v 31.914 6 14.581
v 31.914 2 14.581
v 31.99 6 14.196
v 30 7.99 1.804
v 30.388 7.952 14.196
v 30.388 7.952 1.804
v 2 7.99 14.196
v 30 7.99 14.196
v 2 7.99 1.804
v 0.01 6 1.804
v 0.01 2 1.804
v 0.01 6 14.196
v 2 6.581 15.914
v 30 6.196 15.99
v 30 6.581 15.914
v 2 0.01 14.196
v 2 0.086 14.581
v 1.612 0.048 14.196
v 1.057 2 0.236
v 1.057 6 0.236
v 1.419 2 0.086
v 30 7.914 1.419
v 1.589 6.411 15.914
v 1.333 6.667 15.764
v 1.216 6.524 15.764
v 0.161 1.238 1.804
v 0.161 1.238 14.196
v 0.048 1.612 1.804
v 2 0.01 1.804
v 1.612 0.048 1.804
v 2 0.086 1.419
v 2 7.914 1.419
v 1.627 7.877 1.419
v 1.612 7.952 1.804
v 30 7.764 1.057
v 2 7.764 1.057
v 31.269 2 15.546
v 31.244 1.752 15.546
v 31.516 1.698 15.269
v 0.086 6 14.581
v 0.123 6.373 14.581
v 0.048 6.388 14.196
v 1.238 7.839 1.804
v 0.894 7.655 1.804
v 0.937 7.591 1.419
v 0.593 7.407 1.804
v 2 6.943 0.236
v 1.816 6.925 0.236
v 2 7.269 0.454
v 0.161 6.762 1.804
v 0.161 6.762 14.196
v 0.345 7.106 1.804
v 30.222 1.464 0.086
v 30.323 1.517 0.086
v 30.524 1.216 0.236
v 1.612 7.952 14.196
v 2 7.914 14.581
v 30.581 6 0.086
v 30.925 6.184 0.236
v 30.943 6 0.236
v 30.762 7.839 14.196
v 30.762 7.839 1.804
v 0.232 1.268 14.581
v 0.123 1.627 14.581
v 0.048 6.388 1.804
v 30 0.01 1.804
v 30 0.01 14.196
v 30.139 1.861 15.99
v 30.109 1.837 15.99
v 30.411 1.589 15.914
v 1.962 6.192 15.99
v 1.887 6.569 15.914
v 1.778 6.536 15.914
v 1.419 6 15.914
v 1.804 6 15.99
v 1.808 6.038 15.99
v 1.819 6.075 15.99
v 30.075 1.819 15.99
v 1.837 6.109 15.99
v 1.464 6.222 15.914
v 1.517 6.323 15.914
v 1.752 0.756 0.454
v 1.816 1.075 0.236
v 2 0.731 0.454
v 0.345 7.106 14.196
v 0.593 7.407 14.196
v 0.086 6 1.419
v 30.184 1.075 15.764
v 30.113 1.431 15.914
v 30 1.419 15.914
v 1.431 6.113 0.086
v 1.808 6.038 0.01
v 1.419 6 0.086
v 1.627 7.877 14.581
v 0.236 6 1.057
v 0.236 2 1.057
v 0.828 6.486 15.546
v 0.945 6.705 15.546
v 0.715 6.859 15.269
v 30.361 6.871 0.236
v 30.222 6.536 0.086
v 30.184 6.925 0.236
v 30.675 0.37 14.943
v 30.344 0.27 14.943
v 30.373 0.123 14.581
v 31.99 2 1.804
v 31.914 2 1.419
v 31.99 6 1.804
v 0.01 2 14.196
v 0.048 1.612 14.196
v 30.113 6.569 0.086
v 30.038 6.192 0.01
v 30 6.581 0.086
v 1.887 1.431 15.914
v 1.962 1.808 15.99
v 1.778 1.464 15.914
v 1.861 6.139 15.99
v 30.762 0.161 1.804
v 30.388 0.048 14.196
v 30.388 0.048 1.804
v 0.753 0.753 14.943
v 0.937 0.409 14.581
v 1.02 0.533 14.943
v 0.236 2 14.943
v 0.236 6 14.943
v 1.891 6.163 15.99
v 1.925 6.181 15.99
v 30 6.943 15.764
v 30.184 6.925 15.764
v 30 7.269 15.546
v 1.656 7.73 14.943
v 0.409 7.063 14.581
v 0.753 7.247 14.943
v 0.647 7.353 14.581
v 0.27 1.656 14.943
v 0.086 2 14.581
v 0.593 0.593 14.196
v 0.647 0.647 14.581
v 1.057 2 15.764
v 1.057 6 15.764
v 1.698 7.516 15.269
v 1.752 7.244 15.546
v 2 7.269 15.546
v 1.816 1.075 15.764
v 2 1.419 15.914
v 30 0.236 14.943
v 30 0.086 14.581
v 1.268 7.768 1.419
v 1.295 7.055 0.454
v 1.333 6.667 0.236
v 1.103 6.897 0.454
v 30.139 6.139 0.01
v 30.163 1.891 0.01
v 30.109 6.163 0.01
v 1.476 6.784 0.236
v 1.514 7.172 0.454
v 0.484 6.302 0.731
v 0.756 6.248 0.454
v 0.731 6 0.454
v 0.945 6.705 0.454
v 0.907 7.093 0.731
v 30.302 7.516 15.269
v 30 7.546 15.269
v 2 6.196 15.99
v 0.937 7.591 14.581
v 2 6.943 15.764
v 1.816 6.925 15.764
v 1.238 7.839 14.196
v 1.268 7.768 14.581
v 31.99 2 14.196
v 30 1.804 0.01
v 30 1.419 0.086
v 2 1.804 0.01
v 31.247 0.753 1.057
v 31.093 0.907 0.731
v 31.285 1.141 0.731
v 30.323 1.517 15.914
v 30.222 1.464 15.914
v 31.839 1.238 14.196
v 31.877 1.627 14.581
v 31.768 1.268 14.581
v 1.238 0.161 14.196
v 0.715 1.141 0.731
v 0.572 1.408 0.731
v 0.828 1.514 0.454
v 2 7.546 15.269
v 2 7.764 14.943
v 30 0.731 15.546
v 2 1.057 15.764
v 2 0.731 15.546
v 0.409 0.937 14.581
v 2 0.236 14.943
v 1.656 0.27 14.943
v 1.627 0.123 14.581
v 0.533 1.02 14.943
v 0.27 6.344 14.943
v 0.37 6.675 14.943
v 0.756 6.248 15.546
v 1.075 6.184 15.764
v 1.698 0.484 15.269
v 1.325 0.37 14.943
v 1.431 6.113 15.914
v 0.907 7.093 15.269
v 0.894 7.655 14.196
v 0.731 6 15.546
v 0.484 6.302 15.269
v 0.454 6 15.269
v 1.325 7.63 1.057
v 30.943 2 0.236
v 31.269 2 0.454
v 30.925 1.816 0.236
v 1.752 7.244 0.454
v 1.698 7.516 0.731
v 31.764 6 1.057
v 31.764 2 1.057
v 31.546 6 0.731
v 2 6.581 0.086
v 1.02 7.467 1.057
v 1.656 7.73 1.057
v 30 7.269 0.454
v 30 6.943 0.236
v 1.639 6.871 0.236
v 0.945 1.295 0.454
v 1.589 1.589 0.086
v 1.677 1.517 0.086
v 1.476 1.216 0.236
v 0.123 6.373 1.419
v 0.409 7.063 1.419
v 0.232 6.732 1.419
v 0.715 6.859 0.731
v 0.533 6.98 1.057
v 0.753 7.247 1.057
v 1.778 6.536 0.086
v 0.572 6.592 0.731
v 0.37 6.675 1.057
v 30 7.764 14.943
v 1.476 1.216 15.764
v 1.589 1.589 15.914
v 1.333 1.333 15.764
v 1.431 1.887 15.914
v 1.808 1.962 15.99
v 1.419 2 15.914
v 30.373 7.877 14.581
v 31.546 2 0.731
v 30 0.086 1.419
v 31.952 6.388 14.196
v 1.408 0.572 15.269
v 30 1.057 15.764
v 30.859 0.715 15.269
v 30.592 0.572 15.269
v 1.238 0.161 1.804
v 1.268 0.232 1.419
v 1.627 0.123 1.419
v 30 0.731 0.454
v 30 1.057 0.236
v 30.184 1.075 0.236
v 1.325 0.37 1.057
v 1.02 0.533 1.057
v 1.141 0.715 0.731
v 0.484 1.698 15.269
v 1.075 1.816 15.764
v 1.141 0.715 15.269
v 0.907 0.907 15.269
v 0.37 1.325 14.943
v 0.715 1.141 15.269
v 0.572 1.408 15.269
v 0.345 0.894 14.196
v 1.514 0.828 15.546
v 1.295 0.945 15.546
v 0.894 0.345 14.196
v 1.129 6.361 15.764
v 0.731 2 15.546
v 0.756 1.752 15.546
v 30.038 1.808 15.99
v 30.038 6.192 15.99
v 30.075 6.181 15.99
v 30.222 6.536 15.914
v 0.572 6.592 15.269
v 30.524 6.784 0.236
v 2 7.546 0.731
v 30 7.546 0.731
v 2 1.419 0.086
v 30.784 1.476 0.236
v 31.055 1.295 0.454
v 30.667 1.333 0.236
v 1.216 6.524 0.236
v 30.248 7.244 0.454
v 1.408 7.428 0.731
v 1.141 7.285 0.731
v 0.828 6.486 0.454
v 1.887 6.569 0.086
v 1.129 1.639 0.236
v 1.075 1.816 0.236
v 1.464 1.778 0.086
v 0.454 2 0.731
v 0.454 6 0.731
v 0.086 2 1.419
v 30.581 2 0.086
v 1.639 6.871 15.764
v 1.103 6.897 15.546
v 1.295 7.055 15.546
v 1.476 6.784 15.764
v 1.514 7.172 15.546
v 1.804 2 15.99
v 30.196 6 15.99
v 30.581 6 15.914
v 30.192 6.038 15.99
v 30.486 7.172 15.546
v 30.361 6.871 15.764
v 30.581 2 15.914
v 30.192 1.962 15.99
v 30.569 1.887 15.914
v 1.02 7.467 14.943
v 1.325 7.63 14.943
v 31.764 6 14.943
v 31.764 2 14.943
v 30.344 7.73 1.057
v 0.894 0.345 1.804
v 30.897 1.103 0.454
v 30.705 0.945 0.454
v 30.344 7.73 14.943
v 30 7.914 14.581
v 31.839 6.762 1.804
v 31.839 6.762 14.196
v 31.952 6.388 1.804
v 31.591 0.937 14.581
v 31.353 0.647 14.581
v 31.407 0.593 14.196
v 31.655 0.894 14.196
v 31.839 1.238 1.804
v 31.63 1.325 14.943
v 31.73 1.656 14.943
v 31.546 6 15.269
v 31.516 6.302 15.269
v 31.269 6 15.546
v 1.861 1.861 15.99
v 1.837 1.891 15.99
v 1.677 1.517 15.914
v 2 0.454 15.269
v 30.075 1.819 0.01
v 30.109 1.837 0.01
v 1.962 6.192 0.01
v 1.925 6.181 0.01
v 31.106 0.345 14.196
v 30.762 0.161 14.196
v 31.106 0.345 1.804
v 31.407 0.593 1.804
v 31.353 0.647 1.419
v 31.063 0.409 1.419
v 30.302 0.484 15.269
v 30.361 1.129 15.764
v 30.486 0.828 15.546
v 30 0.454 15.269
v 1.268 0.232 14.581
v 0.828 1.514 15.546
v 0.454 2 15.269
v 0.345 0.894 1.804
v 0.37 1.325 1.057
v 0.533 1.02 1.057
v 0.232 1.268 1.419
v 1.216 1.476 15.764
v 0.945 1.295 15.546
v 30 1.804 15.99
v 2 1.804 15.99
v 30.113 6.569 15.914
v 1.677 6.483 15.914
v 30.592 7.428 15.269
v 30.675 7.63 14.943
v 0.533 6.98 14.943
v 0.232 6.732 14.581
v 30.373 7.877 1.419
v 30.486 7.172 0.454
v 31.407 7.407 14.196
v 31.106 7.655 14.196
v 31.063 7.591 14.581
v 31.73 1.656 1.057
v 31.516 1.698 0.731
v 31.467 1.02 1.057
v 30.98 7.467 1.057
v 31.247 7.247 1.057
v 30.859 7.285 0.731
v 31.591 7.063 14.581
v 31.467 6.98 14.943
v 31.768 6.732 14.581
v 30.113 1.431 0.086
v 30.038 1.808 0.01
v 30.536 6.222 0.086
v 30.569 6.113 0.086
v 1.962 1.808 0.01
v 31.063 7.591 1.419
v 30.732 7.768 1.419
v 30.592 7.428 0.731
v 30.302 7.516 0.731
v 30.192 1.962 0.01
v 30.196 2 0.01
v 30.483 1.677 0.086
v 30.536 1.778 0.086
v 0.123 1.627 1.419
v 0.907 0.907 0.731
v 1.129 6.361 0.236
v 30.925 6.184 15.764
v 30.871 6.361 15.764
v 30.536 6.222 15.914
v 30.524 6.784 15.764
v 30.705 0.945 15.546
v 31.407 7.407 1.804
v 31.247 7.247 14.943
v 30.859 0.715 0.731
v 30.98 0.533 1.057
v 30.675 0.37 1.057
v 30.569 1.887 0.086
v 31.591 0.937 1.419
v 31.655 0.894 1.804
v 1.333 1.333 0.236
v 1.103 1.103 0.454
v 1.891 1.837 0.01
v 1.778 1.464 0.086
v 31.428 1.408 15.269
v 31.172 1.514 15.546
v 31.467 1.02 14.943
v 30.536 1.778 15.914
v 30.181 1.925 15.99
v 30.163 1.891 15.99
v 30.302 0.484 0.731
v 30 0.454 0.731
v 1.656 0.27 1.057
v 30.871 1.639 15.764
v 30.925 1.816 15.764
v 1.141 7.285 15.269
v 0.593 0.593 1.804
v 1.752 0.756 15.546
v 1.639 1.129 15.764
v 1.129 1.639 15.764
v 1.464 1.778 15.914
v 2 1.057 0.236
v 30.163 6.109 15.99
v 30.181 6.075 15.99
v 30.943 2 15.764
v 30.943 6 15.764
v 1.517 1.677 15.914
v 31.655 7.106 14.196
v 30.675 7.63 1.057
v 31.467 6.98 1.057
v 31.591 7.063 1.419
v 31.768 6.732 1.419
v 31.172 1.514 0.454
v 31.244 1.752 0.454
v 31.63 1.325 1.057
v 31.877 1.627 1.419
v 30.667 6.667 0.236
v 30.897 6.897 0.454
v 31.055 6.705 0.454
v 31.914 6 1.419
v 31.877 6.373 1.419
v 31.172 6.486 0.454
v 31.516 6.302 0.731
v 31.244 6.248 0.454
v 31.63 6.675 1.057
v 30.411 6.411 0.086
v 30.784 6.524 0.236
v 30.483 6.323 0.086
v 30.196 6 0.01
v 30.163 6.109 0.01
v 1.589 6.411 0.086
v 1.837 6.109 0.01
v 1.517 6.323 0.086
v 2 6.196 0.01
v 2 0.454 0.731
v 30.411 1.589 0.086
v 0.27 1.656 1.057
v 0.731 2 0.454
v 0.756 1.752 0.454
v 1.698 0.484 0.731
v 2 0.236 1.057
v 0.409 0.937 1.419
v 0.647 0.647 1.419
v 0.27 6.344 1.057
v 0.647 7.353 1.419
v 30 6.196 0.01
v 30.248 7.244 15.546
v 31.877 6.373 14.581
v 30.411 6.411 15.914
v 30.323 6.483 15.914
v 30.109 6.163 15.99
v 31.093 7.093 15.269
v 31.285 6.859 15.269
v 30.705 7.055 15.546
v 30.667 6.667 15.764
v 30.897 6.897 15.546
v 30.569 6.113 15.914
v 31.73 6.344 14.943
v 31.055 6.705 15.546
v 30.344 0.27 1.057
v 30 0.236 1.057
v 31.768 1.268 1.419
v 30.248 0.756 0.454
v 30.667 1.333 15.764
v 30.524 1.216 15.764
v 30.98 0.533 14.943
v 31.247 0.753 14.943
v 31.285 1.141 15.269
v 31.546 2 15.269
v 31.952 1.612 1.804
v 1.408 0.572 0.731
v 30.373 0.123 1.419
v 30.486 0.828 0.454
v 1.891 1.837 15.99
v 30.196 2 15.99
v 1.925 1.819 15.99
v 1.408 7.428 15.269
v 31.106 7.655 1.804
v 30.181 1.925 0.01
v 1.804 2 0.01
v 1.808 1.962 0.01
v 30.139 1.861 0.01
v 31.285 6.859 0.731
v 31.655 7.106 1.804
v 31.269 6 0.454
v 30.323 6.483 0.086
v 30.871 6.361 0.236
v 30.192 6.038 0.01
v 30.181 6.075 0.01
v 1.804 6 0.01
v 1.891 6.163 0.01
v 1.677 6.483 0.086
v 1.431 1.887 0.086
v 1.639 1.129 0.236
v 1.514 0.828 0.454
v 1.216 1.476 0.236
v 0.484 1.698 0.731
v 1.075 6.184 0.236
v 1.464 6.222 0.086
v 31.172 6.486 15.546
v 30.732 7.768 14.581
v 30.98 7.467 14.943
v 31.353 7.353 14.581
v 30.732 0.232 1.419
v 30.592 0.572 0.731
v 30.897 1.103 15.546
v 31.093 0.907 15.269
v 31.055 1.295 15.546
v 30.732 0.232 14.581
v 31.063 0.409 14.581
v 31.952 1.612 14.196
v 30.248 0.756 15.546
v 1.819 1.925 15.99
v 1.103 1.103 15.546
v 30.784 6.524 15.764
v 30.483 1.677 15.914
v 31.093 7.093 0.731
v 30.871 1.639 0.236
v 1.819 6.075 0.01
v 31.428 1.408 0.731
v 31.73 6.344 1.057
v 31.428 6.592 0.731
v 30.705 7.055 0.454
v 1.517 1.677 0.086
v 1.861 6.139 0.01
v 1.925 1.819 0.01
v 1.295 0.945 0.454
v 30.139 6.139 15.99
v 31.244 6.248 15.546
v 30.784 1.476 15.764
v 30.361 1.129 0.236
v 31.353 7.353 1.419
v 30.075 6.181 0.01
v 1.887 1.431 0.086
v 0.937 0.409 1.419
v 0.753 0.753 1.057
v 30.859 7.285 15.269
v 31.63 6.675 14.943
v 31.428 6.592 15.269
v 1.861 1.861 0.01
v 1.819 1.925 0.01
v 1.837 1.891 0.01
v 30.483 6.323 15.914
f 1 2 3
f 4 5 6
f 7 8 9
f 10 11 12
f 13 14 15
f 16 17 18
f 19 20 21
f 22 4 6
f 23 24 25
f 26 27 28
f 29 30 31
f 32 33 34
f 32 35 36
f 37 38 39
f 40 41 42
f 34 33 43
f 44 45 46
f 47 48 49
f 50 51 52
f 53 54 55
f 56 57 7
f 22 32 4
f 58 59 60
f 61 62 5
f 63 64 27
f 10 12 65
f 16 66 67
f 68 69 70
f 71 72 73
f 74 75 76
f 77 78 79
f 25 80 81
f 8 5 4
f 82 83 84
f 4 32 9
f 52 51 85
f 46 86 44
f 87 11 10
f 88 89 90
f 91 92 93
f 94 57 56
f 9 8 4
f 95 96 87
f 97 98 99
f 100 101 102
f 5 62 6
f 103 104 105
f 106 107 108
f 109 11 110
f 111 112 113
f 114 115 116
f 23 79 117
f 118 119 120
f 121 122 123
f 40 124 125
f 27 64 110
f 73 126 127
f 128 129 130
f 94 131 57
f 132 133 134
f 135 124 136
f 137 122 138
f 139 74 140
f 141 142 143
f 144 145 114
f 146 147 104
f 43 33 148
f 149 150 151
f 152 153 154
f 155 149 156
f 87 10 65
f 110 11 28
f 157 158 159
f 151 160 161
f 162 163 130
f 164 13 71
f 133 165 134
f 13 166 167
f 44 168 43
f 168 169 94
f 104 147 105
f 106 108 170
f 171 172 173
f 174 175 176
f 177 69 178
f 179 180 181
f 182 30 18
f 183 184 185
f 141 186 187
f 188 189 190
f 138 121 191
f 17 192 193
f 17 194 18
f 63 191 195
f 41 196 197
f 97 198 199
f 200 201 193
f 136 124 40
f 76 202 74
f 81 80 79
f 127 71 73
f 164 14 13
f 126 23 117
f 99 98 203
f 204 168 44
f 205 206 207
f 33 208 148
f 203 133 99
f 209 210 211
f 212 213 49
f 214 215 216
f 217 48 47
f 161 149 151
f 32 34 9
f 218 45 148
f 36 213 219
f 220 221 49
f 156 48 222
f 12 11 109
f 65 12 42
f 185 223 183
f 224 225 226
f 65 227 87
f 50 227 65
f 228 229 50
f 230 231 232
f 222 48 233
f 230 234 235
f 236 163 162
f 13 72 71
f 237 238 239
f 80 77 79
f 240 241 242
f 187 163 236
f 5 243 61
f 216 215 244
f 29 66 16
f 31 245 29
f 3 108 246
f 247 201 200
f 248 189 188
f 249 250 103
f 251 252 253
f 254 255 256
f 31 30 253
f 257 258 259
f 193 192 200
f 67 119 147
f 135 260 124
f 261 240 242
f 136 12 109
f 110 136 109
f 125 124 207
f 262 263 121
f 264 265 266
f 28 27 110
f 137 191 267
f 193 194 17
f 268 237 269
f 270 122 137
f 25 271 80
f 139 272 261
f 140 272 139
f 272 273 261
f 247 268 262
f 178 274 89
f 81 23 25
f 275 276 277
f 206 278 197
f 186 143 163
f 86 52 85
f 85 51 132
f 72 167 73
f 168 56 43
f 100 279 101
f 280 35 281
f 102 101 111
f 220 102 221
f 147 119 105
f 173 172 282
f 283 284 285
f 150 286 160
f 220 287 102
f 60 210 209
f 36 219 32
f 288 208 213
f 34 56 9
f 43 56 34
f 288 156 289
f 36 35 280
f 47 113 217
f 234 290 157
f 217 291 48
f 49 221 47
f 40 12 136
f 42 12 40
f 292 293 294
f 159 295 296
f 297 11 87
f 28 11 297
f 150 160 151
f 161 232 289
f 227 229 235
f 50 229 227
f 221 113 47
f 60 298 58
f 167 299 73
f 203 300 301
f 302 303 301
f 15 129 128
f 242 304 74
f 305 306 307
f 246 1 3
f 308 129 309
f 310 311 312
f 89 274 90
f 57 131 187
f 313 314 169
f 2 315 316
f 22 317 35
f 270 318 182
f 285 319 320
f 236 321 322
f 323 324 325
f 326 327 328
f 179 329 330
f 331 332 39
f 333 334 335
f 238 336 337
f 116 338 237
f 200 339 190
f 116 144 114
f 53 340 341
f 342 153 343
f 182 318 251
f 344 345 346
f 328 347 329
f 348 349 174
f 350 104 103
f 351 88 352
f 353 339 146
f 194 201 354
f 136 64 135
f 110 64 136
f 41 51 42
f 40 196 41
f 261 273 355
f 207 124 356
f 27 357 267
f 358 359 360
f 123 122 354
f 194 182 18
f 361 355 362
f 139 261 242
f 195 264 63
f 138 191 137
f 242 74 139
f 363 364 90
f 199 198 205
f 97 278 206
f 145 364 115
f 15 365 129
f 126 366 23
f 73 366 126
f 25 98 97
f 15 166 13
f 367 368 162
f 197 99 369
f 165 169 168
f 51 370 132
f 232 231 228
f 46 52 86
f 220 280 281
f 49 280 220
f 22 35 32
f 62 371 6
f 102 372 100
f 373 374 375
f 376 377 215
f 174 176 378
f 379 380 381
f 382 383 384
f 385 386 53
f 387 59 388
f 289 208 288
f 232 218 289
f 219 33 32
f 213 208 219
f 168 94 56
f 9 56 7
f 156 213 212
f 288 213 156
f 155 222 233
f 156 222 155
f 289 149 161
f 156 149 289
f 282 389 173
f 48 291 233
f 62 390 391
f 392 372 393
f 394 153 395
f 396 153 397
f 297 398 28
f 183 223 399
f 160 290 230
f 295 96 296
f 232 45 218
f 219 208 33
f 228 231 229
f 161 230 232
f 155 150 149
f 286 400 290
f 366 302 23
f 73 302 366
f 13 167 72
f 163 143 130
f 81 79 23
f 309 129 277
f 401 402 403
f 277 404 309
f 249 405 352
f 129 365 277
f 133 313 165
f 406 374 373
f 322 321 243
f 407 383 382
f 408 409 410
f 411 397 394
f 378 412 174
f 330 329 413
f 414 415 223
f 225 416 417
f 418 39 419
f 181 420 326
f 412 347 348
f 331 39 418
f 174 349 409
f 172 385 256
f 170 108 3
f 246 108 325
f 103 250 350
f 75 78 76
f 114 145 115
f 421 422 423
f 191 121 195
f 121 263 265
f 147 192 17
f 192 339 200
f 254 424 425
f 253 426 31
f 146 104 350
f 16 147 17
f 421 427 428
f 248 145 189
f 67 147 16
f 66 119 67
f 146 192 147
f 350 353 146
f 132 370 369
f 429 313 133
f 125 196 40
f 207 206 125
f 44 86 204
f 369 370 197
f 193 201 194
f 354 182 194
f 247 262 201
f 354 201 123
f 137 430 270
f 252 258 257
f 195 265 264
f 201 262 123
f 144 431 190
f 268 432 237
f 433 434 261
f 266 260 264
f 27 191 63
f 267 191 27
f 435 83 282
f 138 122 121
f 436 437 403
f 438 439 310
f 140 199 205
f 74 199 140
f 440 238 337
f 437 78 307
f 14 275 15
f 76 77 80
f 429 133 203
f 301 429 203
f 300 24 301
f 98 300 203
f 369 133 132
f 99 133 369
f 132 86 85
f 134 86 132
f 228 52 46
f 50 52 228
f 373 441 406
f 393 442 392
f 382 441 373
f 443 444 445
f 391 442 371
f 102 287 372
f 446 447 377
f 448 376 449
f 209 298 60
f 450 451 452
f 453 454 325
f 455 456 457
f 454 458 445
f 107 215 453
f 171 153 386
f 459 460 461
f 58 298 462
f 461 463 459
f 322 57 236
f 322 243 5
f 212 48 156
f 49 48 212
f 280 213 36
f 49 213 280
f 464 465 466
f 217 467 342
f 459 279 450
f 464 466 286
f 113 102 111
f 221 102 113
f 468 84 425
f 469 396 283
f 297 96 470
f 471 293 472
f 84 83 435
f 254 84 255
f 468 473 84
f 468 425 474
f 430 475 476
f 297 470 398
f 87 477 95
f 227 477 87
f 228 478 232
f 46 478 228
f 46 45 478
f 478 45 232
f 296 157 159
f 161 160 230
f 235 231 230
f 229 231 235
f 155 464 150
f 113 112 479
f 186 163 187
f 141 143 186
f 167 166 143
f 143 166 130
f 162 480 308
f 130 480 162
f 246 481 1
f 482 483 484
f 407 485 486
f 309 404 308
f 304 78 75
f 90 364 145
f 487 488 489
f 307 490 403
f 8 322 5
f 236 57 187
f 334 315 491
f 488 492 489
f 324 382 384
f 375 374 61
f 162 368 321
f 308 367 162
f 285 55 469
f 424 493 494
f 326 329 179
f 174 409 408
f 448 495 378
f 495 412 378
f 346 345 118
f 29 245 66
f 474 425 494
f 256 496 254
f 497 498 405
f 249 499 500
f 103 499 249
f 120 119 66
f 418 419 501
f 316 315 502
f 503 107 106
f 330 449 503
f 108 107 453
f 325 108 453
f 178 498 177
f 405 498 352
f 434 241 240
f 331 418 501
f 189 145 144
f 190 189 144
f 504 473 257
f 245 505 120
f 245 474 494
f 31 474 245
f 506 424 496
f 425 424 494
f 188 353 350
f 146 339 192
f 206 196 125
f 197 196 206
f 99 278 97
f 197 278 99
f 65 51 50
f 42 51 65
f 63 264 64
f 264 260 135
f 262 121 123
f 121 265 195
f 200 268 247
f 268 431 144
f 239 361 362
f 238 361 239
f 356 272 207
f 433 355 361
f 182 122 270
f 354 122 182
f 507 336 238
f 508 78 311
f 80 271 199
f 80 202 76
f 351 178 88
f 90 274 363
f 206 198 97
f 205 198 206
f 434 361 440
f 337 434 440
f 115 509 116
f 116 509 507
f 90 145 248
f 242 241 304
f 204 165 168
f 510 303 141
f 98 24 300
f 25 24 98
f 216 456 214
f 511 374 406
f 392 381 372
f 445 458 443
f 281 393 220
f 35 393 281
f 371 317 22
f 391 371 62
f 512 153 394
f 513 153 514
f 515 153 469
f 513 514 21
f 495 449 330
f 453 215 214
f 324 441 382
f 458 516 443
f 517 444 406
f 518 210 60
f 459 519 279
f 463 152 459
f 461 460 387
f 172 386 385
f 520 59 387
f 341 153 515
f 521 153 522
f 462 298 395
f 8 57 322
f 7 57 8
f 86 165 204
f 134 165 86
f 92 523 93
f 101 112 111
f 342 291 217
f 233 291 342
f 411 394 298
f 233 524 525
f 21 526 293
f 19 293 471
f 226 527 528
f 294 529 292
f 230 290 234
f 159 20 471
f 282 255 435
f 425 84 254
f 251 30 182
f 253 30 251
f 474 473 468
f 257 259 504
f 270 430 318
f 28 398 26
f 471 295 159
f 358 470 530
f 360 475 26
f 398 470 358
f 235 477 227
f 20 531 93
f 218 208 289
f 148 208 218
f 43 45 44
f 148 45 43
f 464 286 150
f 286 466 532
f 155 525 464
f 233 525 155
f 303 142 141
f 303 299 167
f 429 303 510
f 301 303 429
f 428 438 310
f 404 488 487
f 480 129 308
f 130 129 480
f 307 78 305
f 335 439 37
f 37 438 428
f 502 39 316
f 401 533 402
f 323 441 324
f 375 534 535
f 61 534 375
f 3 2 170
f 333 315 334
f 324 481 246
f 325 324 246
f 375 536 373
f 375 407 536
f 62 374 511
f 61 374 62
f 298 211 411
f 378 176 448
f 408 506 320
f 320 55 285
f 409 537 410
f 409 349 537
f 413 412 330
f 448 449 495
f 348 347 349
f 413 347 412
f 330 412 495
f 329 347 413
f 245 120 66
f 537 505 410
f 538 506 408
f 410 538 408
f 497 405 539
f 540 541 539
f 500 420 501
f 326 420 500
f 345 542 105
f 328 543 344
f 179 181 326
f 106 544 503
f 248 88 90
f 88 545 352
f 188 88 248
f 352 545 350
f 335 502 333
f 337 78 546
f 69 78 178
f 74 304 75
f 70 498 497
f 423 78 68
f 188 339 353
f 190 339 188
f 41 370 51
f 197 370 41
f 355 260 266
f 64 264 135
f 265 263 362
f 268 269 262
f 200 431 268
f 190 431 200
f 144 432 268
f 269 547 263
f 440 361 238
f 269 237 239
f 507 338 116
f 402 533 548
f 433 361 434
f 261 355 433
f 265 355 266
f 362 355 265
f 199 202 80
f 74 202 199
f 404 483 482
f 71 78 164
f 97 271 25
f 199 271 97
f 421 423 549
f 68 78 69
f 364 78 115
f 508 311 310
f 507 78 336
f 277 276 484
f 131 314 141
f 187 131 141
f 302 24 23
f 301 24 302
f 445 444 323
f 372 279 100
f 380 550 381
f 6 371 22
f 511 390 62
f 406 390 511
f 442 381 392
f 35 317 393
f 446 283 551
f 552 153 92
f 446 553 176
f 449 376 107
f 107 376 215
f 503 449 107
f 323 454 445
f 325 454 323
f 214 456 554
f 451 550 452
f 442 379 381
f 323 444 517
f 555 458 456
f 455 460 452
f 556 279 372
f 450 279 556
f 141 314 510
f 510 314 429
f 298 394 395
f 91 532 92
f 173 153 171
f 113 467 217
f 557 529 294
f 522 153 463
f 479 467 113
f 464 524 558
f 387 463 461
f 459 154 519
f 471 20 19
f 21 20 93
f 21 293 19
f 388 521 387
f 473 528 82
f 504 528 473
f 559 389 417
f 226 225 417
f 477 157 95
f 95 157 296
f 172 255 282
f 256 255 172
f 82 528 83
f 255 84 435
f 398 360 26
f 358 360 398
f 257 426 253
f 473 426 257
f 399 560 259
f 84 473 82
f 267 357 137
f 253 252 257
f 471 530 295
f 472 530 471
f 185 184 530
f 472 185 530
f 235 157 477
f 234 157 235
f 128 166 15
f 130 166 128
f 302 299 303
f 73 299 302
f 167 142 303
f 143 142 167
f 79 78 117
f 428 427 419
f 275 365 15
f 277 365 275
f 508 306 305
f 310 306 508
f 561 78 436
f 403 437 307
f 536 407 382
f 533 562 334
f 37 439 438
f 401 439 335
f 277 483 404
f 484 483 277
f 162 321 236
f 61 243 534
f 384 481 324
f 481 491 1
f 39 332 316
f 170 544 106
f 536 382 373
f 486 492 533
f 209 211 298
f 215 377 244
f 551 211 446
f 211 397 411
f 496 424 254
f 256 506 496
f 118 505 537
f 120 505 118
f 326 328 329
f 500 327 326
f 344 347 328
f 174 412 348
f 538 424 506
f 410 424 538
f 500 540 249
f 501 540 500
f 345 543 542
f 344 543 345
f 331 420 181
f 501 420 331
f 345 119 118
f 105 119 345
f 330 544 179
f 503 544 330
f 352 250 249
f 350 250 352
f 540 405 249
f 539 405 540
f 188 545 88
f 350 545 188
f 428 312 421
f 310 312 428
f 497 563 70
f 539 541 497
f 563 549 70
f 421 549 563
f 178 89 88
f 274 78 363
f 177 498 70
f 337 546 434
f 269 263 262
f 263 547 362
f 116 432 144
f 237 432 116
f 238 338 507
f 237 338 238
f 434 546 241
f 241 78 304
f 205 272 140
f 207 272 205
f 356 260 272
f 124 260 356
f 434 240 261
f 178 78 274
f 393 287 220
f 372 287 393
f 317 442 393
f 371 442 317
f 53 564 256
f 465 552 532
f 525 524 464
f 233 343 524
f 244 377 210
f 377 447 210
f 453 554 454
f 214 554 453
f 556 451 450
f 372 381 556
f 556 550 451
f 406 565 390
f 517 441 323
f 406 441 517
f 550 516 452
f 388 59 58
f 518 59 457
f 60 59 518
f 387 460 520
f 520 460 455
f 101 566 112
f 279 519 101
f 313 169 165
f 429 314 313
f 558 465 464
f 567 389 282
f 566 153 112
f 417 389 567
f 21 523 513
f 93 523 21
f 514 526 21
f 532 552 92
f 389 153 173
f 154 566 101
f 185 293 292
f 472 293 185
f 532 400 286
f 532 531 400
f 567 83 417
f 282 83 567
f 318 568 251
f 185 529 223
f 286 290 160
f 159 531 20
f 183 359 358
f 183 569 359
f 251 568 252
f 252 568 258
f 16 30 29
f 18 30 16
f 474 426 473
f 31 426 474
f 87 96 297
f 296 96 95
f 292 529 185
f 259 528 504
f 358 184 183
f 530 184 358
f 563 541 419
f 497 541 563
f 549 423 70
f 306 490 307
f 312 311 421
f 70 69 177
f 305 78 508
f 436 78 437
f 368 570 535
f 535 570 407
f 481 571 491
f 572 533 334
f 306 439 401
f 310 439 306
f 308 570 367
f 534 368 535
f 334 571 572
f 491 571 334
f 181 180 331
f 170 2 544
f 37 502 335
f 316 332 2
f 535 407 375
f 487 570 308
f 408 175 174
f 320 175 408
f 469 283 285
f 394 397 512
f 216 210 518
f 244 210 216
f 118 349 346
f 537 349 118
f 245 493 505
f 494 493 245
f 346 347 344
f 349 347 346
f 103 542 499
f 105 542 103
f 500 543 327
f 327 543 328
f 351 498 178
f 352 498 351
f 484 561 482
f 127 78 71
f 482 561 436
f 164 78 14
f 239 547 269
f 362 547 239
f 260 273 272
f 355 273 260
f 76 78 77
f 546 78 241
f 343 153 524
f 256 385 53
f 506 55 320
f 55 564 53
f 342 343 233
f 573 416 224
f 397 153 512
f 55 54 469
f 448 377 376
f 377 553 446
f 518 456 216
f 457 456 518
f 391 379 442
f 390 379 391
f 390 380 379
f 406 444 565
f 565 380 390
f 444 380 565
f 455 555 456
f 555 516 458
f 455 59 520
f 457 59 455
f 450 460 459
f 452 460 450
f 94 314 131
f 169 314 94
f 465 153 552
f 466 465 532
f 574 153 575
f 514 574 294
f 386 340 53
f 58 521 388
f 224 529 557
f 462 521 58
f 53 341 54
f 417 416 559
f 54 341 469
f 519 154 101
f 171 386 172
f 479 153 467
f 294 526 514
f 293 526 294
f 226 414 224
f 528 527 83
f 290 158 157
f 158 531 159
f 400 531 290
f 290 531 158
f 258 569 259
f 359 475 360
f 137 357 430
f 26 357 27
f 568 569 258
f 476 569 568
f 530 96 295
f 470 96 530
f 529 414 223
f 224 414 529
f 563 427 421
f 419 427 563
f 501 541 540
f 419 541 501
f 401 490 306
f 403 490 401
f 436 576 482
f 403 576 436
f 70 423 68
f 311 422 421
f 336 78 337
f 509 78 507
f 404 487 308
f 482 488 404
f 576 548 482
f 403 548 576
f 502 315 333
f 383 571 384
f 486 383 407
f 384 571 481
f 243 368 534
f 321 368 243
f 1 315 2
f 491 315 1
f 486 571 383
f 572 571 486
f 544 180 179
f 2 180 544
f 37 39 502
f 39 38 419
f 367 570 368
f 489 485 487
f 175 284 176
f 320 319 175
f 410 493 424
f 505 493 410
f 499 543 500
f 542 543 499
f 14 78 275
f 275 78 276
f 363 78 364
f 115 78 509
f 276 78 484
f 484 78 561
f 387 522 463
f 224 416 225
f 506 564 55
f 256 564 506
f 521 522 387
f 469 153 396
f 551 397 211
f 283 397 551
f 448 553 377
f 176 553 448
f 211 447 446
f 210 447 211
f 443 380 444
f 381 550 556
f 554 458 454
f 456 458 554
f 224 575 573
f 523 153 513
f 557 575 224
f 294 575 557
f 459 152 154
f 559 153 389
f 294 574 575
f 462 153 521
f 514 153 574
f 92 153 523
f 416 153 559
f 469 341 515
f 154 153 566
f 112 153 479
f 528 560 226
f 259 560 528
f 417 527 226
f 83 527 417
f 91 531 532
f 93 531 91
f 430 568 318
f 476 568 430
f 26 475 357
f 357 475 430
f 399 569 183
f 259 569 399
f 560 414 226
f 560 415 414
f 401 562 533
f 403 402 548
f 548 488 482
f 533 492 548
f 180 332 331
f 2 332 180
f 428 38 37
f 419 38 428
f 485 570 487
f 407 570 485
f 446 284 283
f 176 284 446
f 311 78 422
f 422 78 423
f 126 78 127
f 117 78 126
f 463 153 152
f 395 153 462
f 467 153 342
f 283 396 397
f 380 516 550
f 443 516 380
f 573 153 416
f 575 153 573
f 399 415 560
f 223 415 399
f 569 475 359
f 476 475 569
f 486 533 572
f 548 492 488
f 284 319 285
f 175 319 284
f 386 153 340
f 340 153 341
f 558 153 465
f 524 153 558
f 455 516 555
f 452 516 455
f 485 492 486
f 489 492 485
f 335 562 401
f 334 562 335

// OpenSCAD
// file: ../common/library_function.scad
// 라이브러리, 검증된 것만 이곳에
use <MCAD/boxes.scad>
include	<constants.scad>

// 적정한 fn 값
function fnRound(radious) = $preview ? FN : floor(2 * PI * radious / 0.4) - floor(2 * PI * radious / 0.4) % 4;
//function fnRound(radious) = 2 * PI * radious / 0.4;

// z축 0로로
function set_z(v, z) = [v.x, v.y, z];

// 벡터 회전 계산
function rotate_vector(angle, vector) = rotatez_vector(angle[2], rotatey_vector(angle[1], rotatex_vector(angle[0], vector)));
// x축 기준 회전 벡터 회전 계산
function rotatex_vector(anglex, vector) = [
	vector[0],
	-vector[2] * sin(anglex) + vector[1] * cos(anglex),
	vector[2] * cos(anglex) + vector[1] * sin(anglex)
];
// y축 기준 회전 벡터 회전 계산
function rotatey_vector(angley, vector) = [
	vector[0] * cos(angley) + vector[2] * sin(angley),
	vector[1],
	-vector[0] * sin(angley) + vector[2] * cos(angley)
];

// z축 기준 회전 벡터 회전 계산
function rotatez_vector(anglez, vector) = [
	-vector[1] * sin(anglez) + vector[0] * cos(anglez),
	vector[1] * cos(anglez) + vector[0] * sin(anglez),
	vector[2]
];

//	숫자, 소수점 이하 몇자리
function strfix(number, count) =
	chr([for (cx = [0:
		len(search(".", str(number))) == 0
			? len(str(number)) - 1
			: (search(".", str(number))[0] + count) >= len(str(number))
				? len(str(number)) - 1
				: (search(".", str(number))[0] + count)
	]) ord(str(number)[cx])])
;

//	육면체에서 꼭지점들을 벡터로
function	vectors_from_cube(size) = [
	[0,			0,		0],
	[size.x,	0,		0],
	[size.x,	size.y,	0],
	[0,			size.y,	0],

	[0,			0,		size.z],
	[size.x,	0,		size.z],
	[size.x,	size.y,	size.z],
	[0,			size.y,	size.z]
];
// file: ../common/constants.scad
// 상수들 정의
// include 사용하시오
MAX = [220, 220, 250];
ZERO = [0, 0, 0];
HALF = [1/2, 1/2, 1/2];
ONE = [1, 1, 1];
BIG = [1024, 1024, 1024];
EPSILON = 0.01;
EPSILON2 = EPSILON * 2;
MINIMUM = 0.1;	//	0.1mm
NOZZLE = 0.4;	//	노즐 지름
OVERHANG_THRESHOLD = 30;
HR = "──────────────────────────────────";
DIGIT = "①②③④⑤⑥⑦⑧⑨⑩⑪⑫⑬⑭⑮⑯⑰⑱⑲⑳";
UPPER = "ⒶⒷⒸⒹⒺⒻⒼⒽⒾⒿⓀⓁⓂⓃⓄⓅⓆⓇⓈⓉⓊⓋⓌⓍⓎⓏ";
LOWER = "ⓐⓑⓒⓓⓔⓕⓖⓗⓘⓙⓚⓛⓜⓝⓞⓟⓠⓡⓢⓣⓤⓥⓦⓧⓨⓩ";

FN = $preview ? 16 : 360;

//	자원들
RADIUS_HOLE_NUT_25 = 3.4 / 2;	//	검은색 25mm 나사 너트 구멍 반지름
// main file
include	<../common/constants.scad>
use	<../common/library_function.scad>
use	<../common/library_text.scad>
use <common.scad>

//	모난 구석이 없는 네모 상자
COLOR = [0.3, 0.4, 0.7, 0.9];

module epaper_part08_notate(w) {
	echo(str(parent_module(0), ".", parent_module(1), "(", w, ")"));
	assert(!is_undef(w));

	radius = w[3];
	fontSize = min(w) / 4;

	assert(!is_undef(radius));
	assert(is_num(fontSize));

	//	title(모듈 이름) 표시
	//title = str(parent_module(1), ".", parent_module(2), w);
	title = str(parent_module(1), w);
	color("white")
	translate([w.x / 2, 0, w.z / 2])
	rotate([90, 0, 0])
	%linear_extrude(height = EPSILON) {
		text(title, font = "D2Coding", size = fontSize, halign = "center");
	}
	
	//	x축 길이 표시
	translate([0, -fontSize, 0])	notate([w.x, fontSize]);	//	제일긴거
	translate([0, 0, 0])			notate([radius, fontSize]);	//	왼쪽
	translate([radius, 0, 0])		notate([w.x - radius * 2, fontSize]);	//	중앙
	translate([w.x - radius, 0, 0])	notate([radius, fontSize]);	//	오른쪽
	
	//	y축 길이 표시
	translate([-fontSize, 0, 0])	notate([fontSize, w.y]);
	translate([0, 0, 0])			notate([fontSize, radius]);
	translate([0, radius, 0])		notate([fontSize, w.y - radius * 2]);
	translate([0, w.y - radius, 0])	notate([fontSize, radius]);

	//	y축 길이 표시
	translate([0, -fontSize, 0])	rotate([0, -90, 0])	notate([w.z, fontSize]);
	translate([0, 0, 0])			rotate([0, -90, 0])	notate([radius, fontSize]);
	translate([0, 0, radius])			rotate([0, -90, 0])	notate([w.z - radius * 2, fontSize]);
	translate([0, 0, w.z - radius])	rotate([0, -90, 0])	notate([radius, fontSize]);
}
module epaper_part08(v = [32, 8, 16, 2]) {
	echo(str(parent_module(0), ".", parent_module(1), "(", v, ")"));

	w = is_undef(v) ? [32, 8, 16, 2] : v;
	radius = w[3];

	assert(!is_undef(w));
	assert(!is_undef(radius));

	$fn = $preview ? 16 : 32;
	color(COLOR)
	translate([radius, radius, radius])
	minkowski() {
		cube([w.x - radius * 2, w.y - radius * 2, w.z - radius * 2]);
		
		translate([0, 0, 0])
		sphere(radius);
	}
	
	epaper_part08_notate(w);
}

module main() {
	hr();

	epaper_part08();

	hr();
}

main();
